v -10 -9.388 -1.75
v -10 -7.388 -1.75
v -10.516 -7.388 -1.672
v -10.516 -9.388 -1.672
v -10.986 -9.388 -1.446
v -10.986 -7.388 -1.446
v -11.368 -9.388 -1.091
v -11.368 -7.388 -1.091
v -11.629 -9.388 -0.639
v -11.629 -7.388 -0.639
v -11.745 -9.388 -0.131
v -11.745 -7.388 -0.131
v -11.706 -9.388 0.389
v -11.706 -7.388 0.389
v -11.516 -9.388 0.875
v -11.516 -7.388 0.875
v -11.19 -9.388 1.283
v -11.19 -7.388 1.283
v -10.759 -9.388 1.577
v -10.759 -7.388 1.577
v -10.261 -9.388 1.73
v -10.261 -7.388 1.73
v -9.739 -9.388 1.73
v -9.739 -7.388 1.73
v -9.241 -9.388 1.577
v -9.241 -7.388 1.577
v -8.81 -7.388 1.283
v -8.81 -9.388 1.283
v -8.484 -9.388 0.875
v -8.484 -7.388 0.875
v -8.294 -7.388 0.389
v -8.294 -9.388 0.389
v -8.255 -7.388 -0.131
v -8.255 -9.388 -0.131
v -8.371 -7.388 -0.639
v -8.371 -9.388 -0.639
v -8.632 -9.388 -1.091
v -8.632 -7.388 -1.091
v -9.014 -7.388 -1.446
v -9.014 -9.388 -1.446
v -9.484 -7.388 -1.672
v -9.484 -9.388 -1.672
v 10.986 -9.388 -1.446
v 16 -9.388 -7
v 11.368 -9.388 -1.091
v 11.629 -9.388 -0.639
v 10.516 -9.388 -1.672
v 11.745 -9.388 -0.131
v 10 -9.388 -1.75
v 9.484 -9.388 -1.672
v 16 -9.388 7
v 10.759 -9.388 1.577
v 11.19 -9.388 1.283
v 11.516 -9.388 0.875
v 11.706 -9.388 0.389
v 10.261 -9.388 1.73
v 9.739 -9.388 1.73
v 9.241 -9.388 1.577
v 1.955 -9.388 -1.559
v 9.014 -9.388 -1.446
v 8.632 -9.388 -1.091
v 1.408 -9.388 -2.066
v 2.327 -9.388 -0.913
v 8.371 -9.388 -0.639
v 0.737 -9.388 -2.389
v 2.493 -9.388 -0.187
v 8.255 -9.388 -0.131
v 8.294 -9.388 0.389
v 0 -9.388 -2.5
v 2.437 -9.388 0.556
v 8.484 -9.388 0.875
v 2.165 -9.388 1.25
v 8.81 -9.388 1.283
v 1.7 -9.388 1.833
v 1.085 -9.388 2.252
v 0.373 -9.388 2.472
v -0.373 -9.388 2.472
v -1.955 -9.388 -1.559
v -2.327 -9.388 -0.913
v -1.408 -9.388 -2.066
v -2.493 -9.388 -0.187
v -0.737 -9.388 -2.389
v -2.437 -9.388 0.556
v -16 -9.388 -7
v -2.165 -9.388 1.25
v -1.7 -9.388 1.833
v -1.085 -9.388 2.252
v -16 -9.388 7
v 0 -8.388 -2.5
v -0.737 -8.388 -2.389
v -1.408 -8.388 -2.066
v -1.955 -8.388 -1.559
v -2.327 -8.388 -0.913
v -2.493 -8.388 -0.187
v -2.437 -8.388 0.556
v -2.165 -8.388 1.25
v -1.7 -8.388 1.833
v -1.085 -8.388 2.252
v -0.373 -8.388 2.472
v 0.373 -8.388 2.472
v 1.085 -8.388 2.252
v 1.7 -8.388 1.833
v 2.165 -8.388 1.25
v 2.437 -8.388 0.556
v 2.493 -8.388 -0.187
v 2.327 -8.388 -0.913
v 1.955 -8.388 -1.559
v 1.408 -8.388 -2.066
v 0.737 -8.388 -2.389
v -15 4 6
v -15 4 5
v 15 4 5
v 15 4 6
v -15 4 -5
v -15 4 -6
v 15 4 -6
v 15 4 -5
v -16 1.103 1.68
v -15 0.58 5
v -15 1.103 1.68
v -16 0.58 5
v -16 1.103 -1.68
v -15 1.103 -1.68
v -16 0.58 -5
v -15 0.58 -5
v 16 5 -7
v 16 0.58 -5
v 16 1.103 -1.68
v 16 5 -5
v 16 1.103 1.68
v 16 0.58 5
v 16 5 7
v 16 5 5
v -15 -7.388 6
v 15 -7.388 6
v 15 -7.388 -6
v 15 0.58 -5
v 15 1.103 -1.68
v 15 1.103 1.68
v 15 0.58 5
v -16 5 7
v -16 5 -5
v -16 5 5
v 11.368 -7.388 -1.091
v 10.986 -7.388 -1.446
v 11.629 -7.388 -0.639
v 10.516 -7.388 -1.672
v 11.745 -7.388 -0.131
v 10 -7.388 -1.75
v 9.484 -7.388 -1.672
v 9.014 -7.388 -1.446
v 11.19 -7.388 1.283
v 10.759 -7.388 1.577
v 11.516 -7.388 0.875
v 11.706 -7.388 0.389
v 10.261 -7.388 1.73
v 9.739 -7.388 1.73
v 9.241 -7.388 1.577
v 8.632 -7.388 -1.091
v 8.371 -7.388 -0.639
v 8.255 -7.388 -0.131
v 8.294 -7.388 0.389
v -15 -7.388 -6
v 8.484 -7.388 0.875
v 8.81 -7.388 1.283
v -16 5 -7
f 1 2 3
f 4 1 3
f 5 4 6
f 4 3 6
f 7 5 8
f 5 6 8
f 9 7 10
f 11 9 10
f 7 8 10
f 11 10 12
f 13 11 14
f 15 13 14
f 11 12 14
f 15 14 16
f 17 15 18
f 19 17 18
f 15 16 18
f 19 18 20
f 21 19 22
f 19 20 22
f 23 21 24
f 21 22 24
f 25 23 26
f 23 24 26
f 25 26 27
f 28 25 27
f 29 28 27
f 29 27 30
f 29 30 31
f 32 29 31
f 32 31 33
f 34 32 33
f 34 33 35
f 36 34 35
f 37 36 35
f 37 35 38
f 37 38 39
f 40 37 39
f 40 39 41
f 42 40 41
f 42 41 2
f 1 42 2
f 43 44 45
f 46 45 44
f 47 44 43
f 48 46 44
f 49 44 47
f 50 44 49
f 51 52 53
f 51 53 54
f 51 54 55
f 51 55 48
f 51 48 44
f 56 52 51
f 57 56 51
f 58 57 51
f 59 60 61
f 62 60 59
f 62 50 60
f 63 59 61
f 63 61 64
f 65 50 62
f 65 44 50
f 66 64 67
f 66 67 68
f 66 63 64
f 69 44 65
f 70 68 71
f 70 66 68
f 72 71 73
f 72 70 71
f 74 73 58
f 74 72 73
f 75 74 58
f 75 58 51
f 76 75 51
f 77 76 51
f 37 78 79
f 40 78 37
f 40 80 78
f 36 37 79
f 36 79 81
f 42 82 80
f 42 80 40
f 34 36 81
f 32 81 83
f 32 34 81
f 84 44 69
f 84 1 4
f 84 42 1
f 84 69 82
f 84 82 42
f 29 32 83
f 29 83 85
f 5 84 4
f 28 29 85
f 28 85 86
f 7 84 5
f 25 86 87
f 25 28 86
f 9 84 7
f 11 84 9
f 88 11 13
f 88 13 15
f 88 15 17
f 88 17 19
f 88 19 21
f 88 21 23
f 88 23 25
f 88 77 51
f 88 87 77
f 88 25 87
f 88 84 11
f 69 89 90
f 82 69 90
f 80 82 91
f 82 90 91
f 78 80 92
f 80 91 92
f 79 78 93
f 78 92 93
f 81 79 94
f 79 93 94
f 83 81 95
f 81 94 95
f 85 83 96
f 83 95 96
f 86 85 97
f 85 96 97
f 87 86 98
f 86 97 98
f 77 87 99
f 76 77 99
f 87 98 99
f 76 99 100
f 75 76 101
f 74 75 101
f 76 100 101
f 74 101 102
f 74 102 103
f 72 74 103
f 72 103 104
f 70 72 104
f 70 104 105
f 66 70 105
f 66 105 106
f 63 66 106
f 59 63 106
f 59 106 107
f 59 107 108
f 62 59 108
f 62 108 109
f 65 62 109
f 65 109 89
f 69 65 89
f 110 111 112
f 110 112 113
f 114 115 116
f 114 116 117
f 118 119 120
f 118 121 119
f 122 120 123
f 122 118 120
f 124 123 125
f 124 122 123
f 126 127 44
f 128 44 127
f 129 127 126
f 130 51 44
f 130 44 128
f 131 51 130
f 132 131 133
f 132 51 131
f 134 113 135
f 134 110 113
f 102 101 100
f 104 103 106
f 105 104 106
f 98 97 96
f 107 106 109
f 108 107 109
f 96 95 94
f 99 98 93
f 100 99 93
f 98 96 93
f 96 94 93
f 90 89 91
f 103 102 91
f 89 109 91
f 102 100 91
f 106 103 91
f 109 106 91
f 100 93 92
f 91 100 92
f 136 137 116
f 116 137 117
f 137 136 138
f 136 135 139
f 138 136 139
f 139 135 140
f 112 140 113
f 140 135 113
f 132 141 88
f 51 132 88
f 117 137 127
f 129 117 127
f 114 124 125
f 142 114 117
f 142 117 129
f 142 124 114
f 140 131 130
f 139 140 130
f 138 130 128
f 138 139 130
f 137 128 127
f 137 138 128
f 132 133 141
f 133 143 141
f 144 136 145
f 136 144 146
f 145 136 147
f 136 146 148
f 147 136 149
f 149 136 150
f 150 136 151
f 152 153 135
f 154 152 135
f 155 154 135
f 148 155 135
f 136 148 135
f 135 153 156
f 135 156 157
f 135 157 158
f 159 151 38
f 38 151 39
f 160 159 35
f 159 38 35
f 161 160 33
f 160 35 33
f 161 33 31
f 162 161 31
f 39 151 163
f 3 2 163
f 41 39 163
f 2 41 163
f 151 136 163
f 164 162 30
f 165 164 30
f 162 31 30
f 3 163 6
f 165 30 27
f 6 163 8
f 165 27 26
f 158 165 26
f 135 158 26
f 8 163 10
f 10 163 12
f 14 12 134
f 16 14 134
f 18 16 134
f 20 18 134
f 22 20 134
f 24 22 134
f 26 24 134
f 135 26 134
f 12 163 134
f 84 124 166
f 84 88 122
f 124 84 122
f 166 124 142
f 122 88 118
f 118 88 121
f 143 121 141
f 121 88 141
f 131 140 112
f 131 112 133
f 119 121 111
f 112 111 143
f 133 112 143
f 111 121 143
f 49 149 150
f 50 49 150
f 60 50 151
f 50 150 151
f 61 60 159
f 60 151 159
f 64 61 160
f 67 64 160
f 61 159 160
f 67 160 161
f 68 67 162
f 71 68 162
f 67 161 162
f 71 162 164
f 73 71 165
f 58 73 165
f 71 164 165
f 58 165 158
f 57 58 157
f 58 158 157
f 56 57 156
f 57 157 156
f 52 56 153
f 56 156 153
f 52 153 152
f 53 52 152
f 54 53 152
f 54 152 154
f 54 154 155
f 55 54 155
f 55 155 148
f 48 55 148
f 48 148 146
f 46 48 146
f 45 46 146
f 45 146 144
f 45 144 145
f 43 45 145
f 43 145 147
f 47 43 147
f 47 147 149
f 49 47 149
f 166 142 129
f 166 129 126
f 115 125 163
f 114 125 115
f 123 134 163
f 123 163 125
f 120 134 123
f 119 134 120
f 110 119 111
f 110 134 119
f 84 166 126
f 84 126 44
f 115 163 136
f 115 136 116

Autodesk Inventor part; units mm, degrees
ref_plane "YZ Plane" through (0, 0, 0) normal (1, 0, 0) x (0, 1, 0)
ref_plane "XY Plane" through (0, 0, 0) normal (0, 0, 1) x (1, 0, 0)
sketch "Sketch5" plane through (0, 0, 0) normal (1, 0, 0) x (0, 1, 0)
  line L0 (5, 7) -> (-6, 7)
  line L1 (-6, 7) -> (-6, -5)
  line L2 (-6, -5) -> (5, -5)
  line L3 (5, -5) -> (5, 7)
  line L4 (-6, -5) -> (5, -5)
  line L5 (5, -5) -> (5, -7)
  line L6 (5, -7) -> (-6, -7)
  line L7 (-6, -7) -> (-6, -5)
  line L8 (5, 7) -> (-6, 7)
  line L9 (-6, 7) -> (-6, 5)
  line L10 (-6, 5) -> (5, 5)
  line L11 (5, 5) -> (5, 7)
  line L12 (-51.3319, 0) -> (14.3886, 0) projected
  line L13 (0, -30.178) -> (0, 30.178) projected
  circle A0 centre (-20.3875, 0) radius 16
  circle A1 centre (-20.3875, 0) radius 21.5557
  line L14 (4, 6) -> (-4.4815, 6)
  line L15 (-4.4815, 6) -> (-4.4815, -6)
  line L16 (-4.4815, -6) -> (4, -6)
  line L17 (4, -6) -> (4, 6)
  circle A2 centre (-20.3875, 0) radius 17
  line L18 (-4.4815, -6) -> (-7.3875, -6)
  line L19 (-7.3875, -6) -> (-7.3875, 6)
  line L20 (-7.3875, 6) -> (-4.4815, 6)
  line L21 (-4.4815, 6) -> (-4.4815, -6)
  line L22 (-6, -7) -> (-9.3875, -7)
  line L23 (-9.3875, -7) -> (-9.3875, 7)
  line L24 (-9.3875, 7) -> (-6, 7)
  line L25 (-6, 7) -> (-6, -7)
  point P0 (0, 0)
  point P1 (0, 7)
  point P2 (-6, 7)
  point P3 (-6, -7)
  point P4 (5, -5)
  point P5 (0.5803, -5)
  point P6 (0.5803, 5)
  point P7 (4, -5)
  point P8 (4, 5)
  point P9 (-4.4815, -6)
  point P10 (-6, 7)
  point P11 (-6, -7)
  point P12 (-4.4815, -6)
  point P13 (-4.4815, 6)
  dimension "d14" = 32
  dimension "d25" = 1
  dimension "d15" = 12
  dimension "d16" = 2
  dimension "d17" = 2
  dimension "d18" = 6
  dimension "d19" = 5
  dimension "d20" = 1
  dimension "d22" = 1
  dimension "d23" = 1
  dimension "d31" = 2
  dimension "d32" = 5
extrude "Extrusion4" add sketch "Sketch5" along normal mid plane 32 contours L3 L10 L17 L14 A1 L0 | L13 L14 A2 L0 | A1 L14 L13 | A2 L20 A0 L0 | L14 A1 L10 L13 | L13 L10 A2 L14 | L14 L17 L10 A1 | A0 L20 L1 | L1 L20 L19 L12 L23 L24 | A2 L10 L15 | L15 L10 A0 L20 | L13 L12 A2 L10 | L10 A1 L12 L13 | A1 L16 L17 L2 L5 L6 | L6 A2 L16 L13 | L13 L16 A1 | L20 A0 L10 L1 | L1 L12 L19 L20 | L15 A0 L10 | L10 A2 L12 A0 L15 | L6 A0 L18 A2 | L13 L2 A2 L12 | L12 A1 L2 L13 | L16 A2 L2 L13 | L13 L2 A1 L16 | A1 L2 L17 L16 | L10 A0 L15 L12 L1 | L12 L19 L18 L7 L22 L23 | L7 L18 A0 | A0 L12 L15 | A2 L2 L15 A0 L12 | L18 A0 L2 L15 | L15 L2 A2 | L12 L15 A0 L2 L1 | L1 L7 L18 L19 L12 | L7 L2 A0 L18 | A0 L15 L12 | L2 A0 L15
extrude "Extrusion5" cut sketch "Sketch5" along normal mid plane 30 contours L14 A1 L10 L13 | L13 L10 A2 L14 | L14 L17 L10 A1 | A2 L10 L15 | L15 L10 A0 L20 | L13 L12 A2 L10 | L10 A1 L12 L13 | L20 A0 L10 L1 | L1 L12 L19 L20 | L15 A0 L10 | L10 A2 L12 A0 L15 | L13 L2 A2 L12 | L12 A1 L2 L13 | L16 A2 L2 L13 | L13 L2 A1 L16 | A1 L2 L17 L16 | L10 A0 L15 L12 L1 | A0 L12 L15 | A2 L2 L15 A0 L12 | L18 A0 L2 L15 | L15 L2 A2 | L12 L15 A0 L2 L1 | L1 L7 L18 L19 L12 | L7 L2 A0 L18 | A0 L15 L12 | L2 A0 L15
ref_plane "Work Plane2" through (16, -9.3875, 7) normal (0, 1, 0) x (-1, 0, 0)
sketch "Sketch9" plane through (16, -9.3875, 7) normal (0, 1, 0) x (-1, 0, 0)
  line L0 (38.4, -7) -> (-6.4, -7) projected
  line L1 (16, -16.8) -> (16, 2.8) projected
  point P0 (16, -7)
  point P1 (6, -7)
  point P2 (16, -7)
  point P3 (26, -7)
  dimension "d33" = 20
hole "Hole1" at (10, -9.3875, 0) at (-10, -9.3875, 0) direction (0, 1, 0) diameter 3.5 depth 5
hole "Hole2" at (0, -9.3875, 0) direction (0, 1, 0) diameter 5 depth 1
equation "\"d25\" = d20"
equation "\"d17\" = d16"
equation "\"d22\" = d20"
equation "\"d23\" = d22"
properties part number "Test_Switch_Housing"
